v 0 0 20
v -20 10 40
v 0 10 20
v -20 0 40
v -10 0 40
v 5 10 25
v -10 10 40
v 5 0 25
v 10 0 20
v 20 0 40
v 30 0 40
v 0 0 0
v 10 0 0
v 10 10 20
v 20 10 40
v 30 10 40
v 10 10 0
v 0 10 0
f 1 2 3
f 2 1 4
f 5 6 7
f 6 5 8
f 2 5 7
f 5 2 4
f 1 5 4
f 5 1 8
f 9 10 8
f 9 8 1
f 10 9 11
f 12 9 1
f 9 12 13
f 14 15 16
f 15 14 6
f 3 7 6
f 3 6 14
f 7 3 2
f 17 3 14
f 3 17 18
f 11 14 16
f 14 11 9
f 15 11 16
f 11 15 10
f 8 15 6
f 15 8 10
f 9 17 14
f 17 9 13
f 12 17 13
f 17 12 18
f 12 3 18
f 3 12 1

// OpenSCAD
cube([10, 10, 20]);
translate([0, 0, 20]) {
	multmatrix([ //Shear along X axis.
		[1, 0, -1, 0],
		[0, 1, 0, 0],
		[0, 0, 1, 0]
	]) {
		cube([10, 10, 20]);
	}
	multmatrix([ //Shear along X axis.
		[1, 0, 1, 0],
		[0, 1, 0, 0],
		[0, 0, 1, 0]
	]) {
		cube([10, 10, 20]);
	}
}
